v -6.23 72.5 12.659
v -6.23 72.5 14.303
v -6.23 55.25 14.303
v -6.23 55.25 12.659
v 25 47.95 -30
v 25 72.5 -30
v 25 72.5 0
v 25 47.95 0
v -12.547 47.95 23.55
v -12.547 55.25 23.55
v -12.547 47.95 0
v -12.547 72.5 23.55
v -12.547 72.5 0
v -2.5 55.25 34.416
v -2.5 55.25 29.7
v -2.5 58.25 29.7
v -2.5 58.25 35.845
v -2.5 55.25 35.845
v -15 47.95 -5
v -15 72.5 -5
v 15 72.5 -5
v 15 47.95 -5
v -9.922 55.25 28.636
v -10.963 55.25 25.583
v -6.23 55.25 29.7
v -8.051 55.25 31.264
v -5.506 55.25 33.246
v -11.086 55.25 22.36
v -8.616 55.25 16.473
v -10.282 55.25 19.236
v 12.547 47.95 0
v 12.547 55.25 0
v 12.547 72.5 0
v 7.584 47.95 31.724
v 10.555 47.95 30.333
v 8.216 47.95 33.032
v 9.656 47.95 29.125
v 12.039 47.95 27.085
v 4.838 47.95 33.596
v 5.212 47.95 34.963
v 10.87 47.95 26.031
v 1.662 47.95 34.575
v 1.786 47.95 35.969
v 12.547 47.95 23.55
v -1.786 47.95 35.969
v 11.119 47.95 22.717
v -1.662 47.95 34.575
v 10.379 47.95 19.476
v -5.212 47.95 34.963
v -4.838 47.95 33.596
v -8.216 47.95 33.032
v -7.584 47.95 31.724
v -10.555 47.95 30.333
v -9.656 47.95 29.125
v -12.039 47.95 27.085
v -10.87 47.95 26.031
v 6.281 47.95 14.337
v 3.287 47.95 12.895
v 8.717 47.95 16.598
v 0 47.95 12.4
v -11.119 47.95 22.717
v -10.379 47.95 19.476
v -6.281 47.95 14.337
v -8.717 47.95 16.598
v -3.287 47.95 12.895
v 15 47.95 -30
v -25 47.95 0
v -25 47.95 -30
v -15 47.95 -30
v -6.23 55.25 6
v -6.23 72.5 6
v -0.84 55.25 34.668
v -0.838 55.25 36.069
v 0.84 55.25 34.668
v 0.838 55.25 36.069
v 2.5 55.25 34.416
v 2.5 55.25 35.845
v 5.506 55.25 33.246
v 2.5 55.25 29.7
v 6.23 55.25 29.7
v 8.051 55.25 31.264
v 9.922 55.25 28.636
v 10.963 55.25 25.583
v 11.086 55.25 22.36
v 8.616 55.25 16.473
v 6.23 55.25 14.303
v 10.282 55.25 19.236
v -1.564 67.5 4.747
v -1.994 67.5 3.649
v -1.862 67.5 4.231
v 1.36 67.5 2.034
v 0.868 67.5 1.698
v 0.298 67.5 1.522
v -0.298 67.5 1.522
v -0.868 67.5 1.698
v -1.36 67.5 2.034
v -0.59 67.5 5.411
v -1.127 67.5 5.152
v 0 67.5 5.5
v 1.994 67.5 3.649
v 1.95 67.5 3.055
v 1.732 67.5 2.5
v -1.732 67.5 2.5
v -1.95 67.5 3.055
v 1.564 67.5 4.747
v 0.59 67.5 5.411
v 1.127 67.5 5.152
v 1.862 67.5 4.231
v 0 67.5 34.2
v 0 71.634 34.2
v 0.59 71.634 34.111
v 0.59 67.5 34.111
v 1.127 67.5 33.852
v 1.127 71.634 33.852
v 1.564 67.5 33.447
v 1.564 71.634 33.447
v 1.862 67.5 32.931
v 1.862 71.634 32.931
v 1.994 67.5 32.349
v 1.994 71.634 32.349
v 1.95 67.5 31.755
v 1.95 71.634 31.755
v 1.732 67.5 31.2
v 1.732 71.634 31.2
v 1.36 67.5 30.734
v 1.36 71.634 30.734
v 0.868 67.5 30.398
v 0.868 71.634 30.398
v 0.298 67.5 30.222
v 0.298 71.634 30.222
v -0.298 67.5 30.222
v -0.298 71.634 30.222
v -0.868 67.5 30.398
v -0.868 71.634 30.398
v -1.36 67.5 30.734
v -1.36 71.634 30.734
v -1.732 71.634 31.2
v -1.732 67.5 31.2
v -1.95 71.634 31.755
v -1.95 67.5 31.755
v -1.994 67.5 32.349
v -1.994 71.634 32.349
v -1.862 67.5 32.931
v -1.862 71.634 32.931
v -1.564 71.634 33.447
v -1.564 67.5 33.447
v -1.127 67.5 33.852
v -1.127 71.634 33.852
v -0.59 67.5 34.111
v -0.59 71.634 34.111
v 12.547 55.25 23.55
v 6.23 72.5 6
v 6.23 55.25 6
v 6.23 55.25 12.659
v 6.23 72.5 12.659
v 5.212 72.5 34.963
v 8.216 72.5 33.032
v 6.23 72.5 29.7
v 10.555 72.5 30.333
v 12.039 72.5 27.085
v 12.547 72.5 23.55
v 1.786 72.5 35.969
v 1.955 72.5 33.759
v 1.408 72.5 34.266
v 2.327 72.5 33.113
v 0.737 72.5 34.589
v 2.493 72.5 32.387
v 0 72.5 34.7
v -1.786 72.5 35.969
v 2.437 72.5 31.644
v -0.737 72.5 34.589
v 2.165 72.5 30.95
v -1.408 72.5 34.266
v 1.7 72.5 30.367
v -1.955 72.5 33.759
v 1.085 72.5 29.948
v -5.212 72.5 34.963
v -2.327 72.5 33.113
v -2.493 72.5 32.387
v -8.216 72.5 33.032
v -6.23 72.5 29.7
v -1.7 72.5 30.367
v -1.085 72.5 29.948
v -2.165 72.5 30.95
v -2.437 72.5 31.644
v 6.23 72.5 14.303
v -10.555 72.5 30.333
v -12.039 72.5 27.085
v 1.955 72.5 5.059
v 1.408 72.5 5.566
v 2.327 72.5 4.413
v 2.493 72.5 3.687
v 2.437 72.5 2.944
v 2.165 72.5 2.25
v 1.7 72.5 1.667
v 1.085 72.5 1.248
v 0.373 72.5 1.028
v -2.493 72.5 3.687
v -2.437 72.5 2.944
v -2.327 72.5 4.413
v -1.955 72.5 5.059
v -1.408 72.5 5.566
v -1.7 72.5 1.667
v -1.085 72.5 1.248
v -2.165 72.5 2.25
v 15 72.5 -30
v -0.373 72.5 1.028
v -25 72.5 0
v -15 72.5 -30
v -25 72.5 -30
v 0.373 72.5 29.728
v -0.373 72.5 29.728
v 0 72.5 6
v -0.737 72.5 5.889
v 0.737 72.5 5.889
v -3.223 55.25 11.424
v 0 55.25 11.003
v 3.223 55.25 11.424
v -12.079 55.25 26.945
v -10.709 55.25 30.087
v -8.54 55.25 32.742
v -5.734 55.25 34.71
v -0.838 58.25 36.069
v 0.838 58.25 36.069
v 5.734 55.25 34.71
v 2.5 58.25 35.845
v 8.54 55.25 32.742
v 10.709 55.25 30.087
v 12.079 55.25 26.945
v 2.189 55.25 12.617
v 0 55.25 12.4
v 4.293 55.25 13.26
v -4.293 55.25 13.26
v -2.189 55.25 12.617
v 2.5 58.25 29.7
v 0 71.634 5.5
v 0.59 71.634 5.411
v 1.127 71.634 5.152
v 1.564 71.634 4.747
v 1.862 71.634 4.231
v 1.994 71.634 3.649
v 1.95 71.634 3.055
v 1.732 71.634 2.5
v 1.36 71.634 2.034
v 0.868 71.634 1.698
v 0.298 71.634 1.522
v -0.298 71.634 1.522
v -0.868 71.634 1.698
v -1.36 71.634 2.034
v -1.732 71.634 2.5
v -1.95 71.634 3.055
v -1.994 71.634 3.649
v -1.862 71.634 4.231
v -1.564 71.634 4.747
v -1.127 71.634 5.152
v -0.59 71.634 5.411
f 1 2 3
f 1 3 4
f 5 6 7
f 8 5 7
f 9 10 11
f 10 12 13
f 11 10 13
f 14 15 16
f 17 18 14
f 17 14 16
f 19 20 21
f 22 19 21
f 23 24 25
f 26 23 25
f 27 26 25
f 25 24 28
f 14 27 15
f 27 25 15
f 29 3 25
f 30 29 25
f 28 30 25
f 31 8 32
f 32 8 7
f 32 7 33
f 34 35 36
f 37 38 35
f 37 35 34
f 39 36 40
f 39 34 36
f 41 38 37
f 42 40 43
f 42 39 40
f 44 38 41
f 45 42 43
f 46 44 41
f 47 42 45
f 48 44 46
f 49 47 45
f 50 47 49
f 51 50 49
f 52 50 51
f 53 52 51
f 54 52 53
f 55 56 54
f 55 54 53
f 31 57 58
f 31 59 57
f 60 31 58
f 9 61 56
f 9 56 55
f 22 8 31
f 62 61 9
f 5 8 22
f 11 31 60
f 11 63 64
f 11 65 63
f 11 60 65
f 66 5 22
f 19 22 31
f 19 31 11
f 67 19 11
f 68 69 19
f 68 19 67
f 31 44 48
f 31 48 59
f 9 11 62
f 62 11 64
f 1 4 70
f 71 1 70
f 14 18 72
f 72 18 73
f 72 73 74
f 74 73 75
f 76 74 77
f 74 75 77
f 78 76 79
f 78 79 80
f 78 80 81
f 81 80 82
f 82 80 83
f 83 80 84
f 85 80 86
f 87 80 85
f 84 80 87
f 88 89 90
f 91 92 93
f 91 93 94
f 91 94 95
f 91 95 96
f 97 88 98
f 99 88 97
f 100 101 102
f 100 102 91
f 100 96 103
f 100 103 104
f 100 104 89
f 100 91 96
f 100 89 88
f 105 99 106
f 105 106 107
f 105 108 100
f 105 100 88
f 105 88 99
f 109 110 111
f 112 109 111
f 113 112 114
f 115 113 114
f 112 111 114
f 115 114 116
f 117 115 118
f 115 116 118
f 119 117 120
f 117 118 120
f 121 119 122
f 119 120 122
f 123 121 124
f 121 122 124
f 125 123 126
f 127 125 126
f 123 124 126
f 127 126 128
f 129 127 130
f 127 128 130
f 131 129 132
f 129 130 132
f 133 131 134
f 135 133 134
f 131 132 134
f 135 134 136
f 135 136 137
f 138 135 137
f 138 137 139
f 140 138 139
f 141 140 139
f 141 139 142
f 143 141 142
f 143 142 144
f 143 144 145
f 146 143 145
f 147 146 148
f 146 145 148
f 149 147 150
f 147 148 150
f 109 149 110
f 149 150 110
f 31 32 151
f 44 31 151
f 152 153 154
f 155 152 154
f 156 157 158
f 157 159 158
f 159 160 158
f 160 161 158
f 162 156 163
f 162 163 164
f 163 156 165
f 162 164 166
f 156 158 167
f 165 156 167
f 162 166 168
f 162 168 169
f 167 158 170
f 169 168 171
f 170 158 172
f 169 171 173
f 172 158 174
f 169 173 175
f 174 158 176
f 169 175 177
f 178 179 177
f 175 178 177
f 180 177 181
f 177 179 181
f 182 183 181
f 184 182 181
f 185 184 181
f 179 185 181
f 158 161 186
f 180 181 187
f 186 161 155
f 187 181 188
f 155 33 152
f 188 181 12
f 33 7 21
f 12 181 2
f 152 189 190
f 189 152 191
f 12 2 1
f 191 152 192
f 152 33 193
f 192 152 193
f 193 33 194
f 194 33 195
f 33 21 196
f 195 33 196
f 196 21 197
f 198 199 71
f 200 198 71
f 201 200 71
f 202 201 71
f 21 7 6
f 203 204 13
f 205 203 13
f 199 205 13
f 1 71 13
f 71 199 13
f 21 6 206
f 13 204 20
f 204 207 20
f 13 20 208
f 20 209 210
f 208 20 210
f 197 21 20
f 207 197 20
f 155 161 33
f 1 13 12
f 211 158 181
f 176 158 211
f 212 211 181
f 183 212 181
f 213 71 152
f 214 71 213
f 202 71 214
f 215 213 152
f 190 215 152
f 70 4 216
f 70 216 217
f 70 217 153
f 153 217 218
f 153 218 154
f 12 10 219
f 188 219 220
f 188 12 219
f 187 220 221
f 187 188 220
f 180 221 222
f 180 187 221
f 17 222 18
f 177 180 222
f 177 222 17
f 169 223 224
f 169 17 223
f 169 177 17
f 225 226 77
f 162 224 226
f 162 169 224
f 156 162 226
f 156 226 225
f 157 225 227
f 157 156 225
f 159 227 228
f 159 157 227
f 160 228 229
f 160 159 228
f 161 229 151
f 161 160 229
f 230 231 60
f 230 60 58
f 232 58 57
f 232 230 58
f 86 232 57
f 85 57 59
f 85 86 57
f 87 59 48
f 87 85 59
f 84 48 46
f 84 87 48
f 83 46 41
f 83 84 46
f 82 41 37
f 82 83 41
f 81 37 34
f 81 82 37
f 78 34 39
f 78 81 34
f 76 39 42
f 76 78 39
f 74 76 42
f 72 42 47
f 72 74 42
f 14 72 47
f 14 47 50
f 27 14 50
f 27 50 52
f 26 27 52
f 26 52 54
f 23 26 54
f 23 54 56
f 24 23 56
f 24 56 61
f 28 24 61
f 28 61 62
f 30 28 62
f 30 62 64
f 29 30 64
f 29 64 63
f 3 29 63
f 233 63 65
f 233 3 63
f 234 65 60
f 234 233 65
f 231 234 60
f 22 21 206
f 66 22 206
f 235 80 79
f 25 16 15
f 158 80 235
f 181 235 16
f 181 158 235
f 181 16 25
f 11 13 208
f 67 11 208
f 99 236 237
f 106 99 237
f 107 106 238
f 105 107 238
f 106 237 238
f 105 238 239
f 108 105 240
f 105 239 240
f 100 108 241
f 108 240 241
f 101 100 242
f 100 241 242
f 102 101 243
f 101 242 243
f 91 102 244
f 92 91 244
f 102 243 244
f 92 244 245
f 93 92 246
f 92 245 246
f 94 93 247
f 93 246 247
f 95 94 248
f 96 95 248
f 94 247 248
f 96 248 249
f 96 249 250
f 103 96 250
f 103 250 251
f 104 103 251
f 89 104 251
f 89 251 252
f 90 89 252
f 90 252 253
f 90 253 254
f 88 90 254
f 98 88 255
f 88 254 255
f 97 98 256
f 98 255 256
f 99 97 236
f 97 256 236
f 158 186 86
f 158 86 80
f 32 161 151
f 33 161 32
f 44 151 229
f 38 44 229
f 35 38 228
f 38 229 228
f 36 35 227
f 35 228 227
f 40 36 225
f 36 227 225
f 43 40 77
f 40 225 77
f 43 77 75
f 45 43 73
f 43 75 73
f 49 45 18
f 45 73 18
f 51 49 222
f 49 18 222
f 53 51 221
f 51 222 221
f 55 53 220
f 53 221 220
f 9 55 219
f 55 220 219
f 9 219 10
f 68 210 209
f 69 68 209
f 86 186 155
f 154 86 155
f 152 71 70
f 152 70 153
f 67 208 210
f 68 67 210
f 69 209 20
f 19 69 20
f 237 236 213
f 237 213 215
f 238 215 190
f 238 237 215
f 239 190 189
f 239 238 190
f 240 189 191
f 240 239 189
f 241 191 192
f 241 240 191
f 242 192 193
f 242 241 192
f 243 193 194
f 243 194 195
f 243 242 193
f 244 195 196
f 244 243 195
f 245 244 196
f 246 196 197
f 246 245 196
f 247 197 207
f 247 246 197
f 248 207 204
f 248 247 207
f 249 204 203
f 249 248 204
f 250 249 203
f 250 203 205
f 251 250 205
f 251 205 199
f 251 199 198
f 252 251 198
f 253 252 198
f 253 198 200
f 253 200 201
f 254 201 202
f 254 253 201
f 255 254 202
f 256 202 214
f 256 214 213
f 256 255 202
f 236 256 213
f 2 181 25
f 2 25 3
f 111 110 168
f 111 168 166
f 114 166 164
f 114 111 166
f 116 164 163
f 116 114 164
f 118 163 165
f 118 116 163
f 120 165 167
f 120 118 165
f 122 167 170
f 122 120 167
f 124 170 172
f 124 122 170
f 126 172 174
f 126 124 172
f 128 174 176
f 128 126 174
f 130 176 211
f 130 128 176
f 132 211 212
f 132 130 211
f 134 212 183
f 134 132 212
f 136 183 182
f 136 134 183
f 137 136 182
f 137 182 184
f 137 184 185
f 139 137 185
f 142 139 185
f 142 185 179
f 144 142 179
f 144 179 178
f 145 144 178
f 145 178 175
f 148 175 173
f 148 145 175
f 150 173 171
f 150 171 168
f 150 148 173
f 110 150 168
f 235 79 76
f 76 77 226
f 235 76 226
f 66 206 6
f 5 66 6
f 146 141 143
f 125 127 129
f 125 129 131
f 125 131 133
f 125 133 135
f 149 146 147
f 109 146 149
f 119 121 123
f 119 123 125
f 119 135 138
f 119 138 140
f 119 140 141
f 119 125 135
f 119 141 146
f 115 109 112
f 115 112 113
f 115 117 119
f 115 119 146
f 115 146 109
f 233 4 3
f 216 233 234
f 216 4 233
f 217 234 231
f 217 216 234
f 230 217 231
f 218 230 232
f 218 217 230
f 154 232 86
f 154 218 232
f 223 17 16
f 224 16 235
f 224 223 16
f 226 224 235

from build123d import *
from OCP.BRepFilletAPI import BRepFilletAPI_MakeChamfer

# Parameters (mm, degrees)
SKETCH4_W                = 12.46
SKETCH4_H                = 17.25
BOSS_EXTRUDE3_DEPTH      = 6
BOSS_EXTRUDE6_DEPTH      = 7.3
BOSS_EXTRUDE6_DEPTH_BACK = 17.25
SKETCH8_R                = 12.546781182
SKETCH8_R_2              = 11.15
BOSS_EXTRUDE4_DEPTH      = 17.25
SKETCH6_R                = 2
CUT_EXTRUDE1_DEPTH       = 5
CHAMFER1_SIZE            = 0.5
CHAMFER1_SIZE_2          = 0.866025404
SKETCH10_W               = 12.46
SKETCH10_H               = 23.7
CUT_EXTRUDE3_DEPTH       = 17.25
CUT_EXTRUDE4_REACH       = 83.955
SKETCH11_W               = 5
SKETCH11_H               = 3
BOSS_EXTRUDE7_START      = -7.3
BOSS_EXTRUDE7_DEPTH      = 7.3
BOSS_EXTRUDE8_DEPTH      = 24.55


with BuildPart() as part:
    # Sketch4 → Boss-Extrude3 (new body)
    with BuildSketch(Plane.XY):
        with Locations((0, 63.875025481)):
            Rectangle(SKETCH4_W, SKETCH4_H)
    extrude(amount=BOSS_EXTRUDE3_DEPTH)



with BuildPart() as body_2:
    # Sketch8 → Boss-Extrude6 (new, two sides: drawn at the far end of the back side and taken through both)
    with BuildSketch(Plane(origin=(0, 55.250025481, 0), x_dir=(-1, 0, 0), z_dir=(0, -1, 0)).offset(-BOSS_EXTRUDE6_DEPTH_BACK)):
        with Locations(Location((0, -23.55, 0), (0, 0, 90))):
            Circle(SKETCH8_R)
        with Locations(Location((0, -23.55, 0), (0, 0, 90))):
            Circle(SKETCH8_R_2, mode=Mode.SUBTRACT)
    extrude(amount=BOSS_EXTRUDE6_DEPTH + BOSS_EXTRUDE6_DEPTH_BACK)


with BuildPart() as part_1:
    add(part.part)

    add(body_2.part)  # Boss-Extrude4 merges body 2
    # Sketch5 → Boss-Extrude4 (add)
    with BuildSketch(Plane(origin=(0, 72.500025481, 0), x_dir=(1, 0, 0), z_dir=(0, 1, 0))):
        with BuildLine():
            Line((12.546781182, -23.55), (12.546781182, 0))
            Line((12.546781182, 0), (6.23, 0))
            Line((6.23, 0), (6.23, -29.7))
            Line((6.23, -29.7), (-6.23, -29.7))
            Line((-6.23, -29.7), (-6.23, 0))
            Line((-6.23, 0), (-12.546781182, 0))
            Line((-12.546781182, 0), (-12.546781182, -23.55))
            ThreePointArc((-12.546781182, -23.55), (0, -36.096781182), (12.546781182, -23.55))
        make_face()
    extrude(amount=-BOSS_EXTRUDE4_DEPTH)

    # Sketch6 → Cut-Extrude1 (cut)
    with BuildSketch(Plane(origin=(0, 72.500025481, 0), x_dir=(1, 0, 0), z_dir=(0, 1, 0))):
        with Locations(Location((0, -3.5, 0), (0, 0, 270))):
            Circle(SKETCH6_R)
        with Locations(Location((0, -32.2, 0), (0, 0, 270))):
            Circle(SKETCH6_R)
    extrude(amount=-CUT_EXTRUDE1_DEPTH, mode=Mode.SUBTRACT)

    # Chamfer1
    chamfer1_edges_1 = [part_1.edges().sort_by_distance(p)[0] for p in [
        (0, 72.500025481, 1.5),
    ]]
    chamfer1_side_1 = [part_1.faces().sort_by_distance(p)[0] for p in [
        (0, 72.500025481, 1.49),
    ]]
    chamfer1_edges_2 = [part_1.edges().sort_by_distance(p)[0] for p in [
        (0, 72.500025481, 30.2),
    ]]
    chamfer1_side_2 = [part_1.faces().sort_by_distance(p)[0] for p in [
        (0, 72.500025481, 30.19),
    ]]
    chamfer1 = BRepFilletAPI_MakeChamfer(part_1.part.solid().wrapped)
    for e in chamfer1_edges_1:
        chamfer1.Add(CHAMFER1_SIZE - 0.0001, CHAMFER1_SIZE_2 - 0.0001, e.wrapped, chamfer1_side_1[0].wrapped)
    for e in chamfer1_edges_2:
        chamfer1.Add(CHAMFER1_SIZE - 0.0001, CHAMFER1_SIZE_2 - 0.0001, e.wrapped, chamfer1_side_2[0].wrapped)
    add(Compound.cast(chamfer1.Shape()), mode=Mode.REPLACE)  # a hair under: the kernel refuses the full size

    # Sketch10 → Cut-Extrude3 (cut)
    with BuildSketch(Plane(origin=(0, 72.500025481, 0), x_dir=(1, 0, 0), z_dir=(0, 1, 0))):
        with Locations((0, -17.85)):
            Rectangle(SKETCH10_W, SKETCH10_H)
    extrude(amount=-CUT_EXTRUDE3_DEPTH, mode=Mode.SUBTRACT)

    # Sketch11 → Cut-Extrude4 (cut, up to next)
    with BuildSketch(Plane.XY.offset(36.096781182), mode=Mode.PRIVATE) as cut_extrude4_sk1:
        with Locations((0, 56.750025481)):
            Rectangle(SKETCH11_W, SKETCH11_H)
    cut_extrude4_tool1 = extrude(cut_extrude4_sk1.sketch, amount=-CUT_EXTRUDE4_REACH, mode=Mode.PRIVATE) & part_1.part
    add(cut_extrude4_tool1.solids().sort_by_distance((0, 56.750025, 36.096781))[0], mode=Mode.SUBTRACT)

    # Sketch13 → Boss-Extrude7 (add)
    with BuildSketch(Plane.XZ.offset(-47.950025481).offset(BOSS_EXTRUDE7_START)):
        with BuildLine():
            Line((-12.546781182, 23.55), (-12.546781182, 0))
            Line((-12.546781182, 0), (12.546781182, 0))
            Line((12.546781182, 0), (12.546781182, 23.55))
            ThreePointArc((12.546781182, 23.55), (0, 11.003218818), (-12.546781182, 23.55))
        make_face()
    extrude(amount=BOSS_EXTRUDE7_DEPTH)

    # Sketch14 → Boss-Extrude8 (add)
    with BuildSketch(Plane(origin=(0, 72.500025481, 0), x_dir=(1, 0, 0), z_dir=(0, 1, 0))):
        Polygon((-25, 0), (-25, 30), (-15, 30), (-15, 5), (15, 5), (15, 30), (25, 30), (25, 0), align=None)
    extrude(amount=-BOSS_EXTRUDE8_DEPTH)


solid = part_1.part
